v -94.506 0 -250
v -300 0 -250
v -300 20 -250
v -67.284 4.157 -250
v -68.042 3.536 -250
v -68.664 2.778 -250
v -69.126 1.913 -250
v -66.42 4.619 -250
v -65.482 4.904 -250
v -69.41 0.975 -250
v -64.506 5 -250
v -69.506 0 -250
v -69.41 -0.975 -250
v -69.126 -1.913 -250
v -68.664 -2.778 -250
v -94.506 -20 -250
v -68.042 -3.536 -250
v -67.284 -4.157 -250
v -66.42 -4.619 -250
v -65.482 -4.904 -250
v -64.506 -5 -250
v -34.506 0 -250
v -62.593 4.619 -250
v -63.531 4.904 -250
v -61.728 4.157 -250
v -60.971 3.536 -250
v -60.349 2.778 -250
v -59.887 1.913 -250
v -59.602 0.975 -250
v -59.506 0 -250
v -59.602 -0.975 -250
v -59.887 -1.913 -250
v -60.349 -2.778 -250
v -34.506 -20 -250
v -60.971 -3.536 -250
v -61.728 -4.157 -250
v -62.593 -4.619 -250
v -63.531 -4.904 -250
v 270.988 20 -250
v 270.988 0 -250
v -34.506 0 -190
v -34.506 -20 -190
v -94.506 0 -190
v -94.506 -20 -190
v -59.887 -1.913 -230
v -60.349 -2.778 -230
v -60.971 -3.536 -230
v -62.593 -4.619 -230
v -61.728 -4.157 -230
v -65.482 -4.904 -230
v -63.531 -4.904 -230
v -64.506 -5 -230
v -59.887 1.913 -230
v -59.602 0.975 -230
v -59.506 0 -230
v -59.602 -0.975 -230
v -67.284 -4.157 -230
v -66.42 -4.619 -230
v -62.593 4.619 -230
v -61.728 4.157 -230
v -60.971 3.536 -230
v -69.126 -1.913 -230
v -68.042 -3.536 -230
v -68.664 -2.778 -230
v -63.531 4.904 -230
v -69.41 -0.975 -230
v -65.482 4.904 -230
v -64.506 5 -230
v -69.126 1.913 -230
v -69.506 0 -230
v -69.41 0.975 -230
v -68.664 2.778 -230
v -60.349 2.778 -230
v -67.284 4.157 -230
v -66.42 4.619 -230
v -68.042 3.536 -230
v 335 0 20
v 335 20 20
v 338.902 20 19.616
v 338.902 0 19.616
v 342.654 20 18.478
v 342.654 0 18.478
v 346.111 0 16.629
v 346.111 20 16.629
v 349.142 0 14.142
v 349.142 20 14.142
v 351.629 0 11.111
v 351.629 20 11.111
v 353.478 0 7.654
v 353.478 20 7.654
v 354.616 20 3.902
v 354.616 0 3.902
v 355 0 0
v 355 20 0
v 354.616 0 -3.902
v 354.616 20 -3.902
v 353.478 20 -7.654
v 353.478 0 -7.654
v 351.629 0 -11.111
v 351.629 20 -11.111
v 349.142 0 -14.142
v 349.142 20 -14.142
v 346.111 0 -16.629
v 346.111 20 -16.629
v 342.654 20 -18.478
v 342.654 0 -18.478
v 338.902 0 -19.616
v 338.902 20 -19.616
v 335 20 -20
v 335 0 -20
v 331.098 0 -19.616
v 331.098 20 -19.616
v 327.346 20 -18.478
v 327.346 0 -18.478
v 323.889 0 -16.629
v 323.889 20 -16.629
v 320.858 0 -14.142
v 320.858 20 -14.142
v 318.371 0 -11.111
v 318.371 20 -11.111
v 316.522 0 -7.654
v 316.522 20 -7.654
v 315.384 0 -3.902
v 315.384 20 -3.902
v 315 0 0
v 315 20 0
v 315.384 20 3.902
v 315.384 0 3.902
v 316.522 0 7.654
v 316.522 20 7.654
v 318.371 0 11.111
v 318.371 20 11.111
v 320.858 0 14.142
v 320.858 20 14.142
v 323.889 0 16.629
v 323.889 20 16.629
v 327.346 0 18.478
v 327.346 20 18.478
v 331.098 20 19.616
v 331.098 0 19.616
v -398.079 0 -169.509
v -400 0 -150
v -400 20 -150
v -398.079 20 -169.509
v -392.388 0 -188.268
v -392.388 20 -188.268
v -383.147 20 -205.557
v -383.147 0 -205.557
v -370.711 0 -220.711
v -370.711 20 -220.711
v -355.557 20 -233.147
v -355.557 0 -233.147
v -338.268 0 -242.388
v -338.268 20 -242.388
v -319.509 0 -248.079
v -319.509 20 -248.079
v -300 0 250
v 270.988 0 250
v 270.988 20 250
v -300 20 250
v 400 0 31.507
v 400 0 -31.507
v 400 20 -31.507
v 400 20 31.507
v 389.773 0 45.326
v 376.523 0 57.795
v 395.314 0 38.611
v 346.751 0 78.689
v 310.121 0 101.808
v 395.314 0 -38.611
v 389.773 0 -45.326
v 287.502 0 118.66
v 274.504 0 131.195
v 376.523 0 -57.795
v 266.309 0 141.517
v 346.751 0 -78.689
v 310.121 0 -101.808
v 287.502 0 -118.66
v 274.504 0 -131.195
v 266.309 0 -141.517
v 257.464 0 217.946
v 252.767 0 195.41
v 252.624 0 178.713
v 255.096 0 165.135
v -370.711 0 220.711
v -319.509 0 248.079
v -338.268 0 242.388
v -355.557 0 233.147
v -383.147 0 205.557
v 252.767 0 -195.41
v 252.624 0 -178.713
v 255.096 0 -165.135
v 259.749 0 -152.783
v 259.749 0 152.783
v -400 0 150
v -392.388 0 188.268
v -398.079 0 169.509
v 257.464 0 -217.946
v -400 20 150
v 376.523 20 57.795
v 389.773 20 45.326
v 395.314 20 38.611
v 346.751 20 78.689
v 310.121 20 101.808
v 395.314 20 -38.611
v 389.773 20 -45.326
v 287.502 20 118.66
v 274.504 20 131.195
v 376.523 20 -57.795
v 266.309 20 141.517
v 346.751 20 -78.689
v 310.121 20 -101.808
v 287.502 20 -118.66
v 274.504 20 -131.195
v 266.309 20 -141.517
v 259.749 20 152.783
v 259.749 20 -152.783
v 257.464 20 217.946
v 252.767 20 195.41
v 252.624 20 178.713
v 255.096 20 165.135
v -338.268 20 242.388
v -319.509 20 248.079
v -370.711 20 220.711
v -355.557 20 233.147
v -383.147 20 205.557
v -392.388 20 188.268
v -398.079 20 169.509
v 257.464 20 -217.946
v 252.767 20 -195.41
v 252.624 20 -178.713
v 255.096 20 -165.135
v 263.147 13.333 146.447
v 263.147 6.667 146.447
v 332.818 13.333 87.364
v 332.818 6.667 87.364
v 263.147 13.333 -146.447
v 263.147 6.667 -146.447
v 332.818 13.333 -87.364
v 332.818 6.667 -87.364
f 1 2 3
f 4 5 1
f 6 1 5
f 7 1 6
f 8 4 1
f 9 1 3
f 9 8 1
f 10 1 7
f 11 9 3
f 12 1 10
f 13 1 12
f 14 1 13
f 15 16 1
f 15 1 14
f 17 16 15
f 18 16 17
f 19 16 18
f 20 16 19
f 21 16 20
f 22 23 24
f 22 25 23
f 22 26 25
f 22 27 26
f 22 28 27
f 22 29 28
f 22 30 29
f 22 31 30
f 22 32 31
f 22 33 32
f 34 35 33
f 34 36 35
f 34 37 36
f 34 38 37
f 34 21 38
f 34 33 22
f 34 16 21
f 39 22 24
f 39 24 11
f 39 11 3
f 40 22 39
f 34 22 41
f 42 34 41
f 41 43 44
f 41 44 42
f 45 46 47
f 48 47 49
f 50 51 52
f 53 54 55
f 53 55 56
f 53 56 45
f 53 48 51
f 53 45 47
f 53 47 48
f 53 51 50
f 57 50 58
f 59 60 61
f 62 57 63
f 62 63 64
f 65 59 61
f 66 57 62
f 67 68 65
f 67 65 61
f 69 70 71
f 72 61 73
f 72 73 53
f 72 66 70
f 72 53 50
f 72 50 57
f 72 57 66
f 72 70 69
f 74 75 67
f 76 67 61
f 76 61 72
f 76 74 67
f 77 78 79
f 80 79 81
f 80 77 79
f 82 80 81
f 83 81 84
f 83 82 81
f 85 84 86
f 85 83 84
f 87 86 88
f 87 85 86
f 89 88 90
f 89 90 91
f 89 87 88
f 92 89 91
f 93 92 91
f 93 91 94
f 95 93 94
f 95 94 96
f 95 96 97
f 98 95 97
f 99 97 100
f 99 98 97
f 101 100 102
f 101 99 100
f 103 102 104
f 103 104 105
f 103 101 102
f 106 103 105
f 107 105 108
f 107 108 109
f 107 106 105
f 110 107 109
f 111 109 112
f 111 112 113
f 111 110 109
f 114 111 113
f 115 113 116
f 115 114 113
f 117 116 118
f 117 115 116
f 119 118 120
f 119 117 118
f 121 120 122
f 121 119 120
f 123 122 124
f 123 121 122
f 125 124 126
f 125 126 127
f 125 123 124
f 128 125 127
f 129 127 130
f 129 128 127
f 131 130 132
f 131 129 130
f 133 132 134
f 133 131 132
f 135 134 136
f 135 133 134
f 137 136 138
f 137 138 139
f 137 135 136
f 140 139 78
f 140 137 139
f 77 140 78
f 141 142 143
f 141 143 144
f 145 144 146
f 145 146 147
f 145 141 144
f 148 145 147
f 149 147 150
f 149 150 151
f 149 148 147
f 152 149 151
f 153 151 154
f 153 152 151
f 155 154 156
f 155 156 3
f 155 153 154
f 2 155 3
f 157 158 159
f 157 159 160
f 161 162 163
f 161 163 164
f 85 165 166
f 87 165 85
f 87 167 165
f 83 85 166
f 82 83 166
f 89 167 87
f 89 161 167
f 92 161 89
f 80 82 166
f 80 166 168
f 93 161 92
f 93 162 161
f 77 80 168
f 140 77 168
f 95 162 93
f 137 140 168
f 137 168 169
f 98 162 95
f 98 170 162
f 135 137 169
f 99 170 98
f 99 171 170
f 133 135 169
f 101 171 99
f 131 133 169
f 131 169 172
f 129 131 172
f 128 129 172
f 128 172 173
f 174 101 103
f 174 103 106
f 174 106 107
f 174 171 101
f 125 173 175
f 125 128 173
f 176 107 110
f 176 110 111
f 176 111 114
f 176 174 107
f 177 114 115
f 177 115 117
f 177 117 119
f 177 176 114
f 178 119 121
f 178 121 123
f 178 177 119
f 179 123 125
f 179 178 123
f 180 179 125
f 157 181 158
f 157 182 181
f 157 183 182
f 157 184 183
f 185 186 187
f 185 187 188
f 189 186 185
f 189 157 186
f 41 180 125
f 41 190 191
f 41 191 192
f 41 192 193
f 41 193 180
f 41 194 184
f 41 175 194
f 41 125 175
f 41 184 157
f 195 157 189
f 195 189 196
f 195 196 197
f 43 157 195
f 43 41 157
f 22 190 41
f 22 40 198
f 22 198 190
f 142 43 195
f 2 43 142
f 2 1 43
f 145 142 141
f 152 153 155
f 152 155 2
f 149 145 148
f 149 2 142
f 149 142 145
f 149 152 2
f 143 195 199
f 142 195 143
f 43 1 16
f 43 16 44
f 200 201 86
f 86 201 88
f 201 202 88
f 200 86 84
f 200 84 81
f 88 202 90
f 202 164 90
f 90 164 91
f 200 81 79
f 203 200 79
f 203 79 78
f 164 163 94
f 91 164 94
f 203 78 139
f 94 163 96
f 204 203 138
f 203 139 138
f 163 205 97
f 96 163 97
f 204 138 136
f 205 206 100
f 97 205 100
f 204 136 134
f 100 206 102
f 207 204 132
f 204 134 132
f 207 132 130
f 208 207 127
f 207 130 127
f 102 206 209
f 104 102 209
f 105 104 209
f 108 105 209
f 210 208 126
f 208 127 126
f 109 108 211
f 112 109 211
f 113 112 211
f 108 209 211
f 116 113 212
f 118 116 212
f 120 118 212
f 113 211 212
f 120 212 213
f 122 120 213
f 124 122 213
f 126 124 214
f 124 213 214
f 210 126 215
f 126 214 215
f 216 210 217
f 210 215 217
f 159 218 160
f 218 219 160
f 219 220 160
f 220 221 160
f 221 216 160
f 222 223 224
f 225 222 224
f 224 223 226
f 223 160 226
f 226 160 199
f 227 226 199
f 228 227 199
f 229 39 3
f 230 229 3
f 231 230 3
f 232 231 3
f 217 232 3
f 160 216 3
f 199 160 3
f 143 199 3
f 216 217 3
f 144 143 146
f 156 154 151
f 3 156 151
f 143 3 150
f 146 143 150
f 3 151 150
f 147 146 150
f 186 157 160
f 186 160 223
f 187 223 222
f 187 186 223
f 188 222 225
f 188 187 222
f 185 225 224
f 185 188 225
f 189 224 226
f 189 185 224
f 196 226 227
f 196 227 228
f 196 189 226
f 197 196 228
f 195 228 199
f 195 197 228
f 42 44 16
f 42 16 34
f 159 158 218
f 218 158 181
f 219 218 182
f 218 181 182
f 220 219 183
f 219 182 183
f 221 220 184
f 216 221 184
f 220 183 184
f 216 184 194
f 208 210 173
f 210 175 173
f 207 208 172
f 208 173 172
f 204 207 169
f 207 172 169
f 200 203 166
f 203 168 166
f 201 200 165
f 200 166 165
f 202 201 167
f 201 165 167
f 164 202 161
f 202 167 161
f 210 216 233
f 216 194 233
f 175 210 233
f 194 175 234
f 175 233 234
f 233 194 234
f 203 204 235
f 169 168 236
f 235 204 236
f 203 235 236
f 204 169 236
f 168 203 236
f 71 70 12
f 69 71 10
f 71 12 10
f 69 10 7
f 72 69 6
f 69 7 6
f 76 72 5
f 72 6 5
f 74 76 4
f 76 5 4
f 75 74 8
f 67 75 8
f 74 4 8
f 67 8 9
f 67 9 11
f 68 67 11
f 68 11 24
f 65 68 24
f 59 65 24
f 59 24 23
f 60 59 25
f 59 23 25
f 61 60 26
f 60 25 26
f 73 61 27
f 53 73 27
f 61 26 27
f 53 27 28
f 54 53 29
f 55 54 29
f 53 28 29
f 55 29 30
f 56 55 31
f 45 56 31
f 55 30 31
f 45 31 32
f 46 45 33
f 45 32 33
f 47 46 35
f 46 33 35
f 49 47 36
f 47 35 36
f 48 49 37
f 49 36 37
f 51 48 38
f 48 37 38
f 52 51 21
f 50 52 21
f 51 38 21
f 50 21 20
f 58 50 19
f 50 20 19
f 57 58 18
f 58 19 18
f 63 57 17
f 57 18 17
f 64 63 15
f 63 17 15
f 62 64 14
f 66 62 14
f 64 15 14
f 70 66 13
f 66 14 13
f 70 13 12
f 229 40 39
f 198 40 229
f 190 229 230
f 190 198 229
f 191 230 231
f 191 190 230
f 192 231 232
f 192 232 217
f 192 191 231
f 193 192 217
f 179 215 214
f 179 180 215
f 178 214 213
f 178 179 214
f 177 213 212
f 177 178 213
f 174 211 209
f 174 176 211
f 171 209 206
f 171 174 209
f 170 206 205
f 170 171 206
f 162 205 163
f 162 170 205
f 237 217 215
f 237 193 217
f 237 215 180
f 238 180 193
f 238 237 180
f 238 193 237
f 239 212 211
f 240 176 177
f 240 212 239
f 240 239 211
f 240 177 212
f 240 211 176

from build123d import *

# Parameters (mm, degrees)
SKETCH1_R           = 20
BOSS_EXTRUDE1_DEPTH = 20
SKETCH2_W           = 60
SKETCH2_H           = 60
BOSS_EXTRUDE2_DEPTH = 20
SKETCH3_R           = 5
CUT_EXTRUDE1_DEPTH  = 20


with BuildPart() as part:
    # Sketch1 → Boss-Extrude1 (new body)
    with BuildSketch(Plane(origin=(0, 0, 0), x_dir=(1, 0, 0), z_dir=(0, 1, 0))):
        with BuildLine():
            Line((-300, 250), (270.987668093, 250))
            add(Edge.make_bspline(
                [(270.987668093, 250), (197.722942543, 110.46504325), (360.729994598, 99.497758331), (400, 31.506674192)],
                knots=[0, 0, 0, 0, 0.79710865, 0.79710865, 0.79710865, 0.79710865], degree=3))
            Line((400, 31.506674192), (400, -31.506674192))
            add(Edge.make_bspline(
                [(270.987668093, -250), (197.722942543, -110.46504325), (360.729994598, -99.497758331), (400, -31.506674192)],
                knots=[0, 0, 0, 0, 0.79710865, 0.79710865, 0.79710865, 0.79710865], degree=3))
            Line((270.987668093, -250), (-300, -250))
            ThreePointArc((-300, -250), (-370.710678119, -220.710678119), (-400, -150))
            Line((-400, -150), (-400, 150))
            ThreePointArc((-400, 150), (-370.710678119, 220.710678119), (-300, 250))
        make_face()
        with Locations(Location((335, 0, 0), (0, 0, 270))):
            Circle(SKETCH1_R, mode=Mode.SUBTRACT)
    extrude(amount=BOSS_EXTRUDE1_DEPTH)

    # Sketch2 → Boss-Extrude2 (add)
    with BuildSketch(Plane.XZ):
        with Locations((-64.506165954, -220)):
            Rectangle(SKETCH2_W, SKETCH2_H)
    extrude(amount=BOSS_EXTRUDE2_DEPTH)

    # Sketch3 → Cut-Extrude1 (cut)
    with BuildSketch(Plane(origin=(0, 0, -250), x_dir=(-1, 0, 0), z_dir=(0, 0, -1))):
        with Locations((64.506165954, 0)):
            Circle(SKETCH3_R)
    extrude(amount=-CUT_EXTRUDE1_DEPTH, mode=Mode.SUBTRACT)


solid = part.part
